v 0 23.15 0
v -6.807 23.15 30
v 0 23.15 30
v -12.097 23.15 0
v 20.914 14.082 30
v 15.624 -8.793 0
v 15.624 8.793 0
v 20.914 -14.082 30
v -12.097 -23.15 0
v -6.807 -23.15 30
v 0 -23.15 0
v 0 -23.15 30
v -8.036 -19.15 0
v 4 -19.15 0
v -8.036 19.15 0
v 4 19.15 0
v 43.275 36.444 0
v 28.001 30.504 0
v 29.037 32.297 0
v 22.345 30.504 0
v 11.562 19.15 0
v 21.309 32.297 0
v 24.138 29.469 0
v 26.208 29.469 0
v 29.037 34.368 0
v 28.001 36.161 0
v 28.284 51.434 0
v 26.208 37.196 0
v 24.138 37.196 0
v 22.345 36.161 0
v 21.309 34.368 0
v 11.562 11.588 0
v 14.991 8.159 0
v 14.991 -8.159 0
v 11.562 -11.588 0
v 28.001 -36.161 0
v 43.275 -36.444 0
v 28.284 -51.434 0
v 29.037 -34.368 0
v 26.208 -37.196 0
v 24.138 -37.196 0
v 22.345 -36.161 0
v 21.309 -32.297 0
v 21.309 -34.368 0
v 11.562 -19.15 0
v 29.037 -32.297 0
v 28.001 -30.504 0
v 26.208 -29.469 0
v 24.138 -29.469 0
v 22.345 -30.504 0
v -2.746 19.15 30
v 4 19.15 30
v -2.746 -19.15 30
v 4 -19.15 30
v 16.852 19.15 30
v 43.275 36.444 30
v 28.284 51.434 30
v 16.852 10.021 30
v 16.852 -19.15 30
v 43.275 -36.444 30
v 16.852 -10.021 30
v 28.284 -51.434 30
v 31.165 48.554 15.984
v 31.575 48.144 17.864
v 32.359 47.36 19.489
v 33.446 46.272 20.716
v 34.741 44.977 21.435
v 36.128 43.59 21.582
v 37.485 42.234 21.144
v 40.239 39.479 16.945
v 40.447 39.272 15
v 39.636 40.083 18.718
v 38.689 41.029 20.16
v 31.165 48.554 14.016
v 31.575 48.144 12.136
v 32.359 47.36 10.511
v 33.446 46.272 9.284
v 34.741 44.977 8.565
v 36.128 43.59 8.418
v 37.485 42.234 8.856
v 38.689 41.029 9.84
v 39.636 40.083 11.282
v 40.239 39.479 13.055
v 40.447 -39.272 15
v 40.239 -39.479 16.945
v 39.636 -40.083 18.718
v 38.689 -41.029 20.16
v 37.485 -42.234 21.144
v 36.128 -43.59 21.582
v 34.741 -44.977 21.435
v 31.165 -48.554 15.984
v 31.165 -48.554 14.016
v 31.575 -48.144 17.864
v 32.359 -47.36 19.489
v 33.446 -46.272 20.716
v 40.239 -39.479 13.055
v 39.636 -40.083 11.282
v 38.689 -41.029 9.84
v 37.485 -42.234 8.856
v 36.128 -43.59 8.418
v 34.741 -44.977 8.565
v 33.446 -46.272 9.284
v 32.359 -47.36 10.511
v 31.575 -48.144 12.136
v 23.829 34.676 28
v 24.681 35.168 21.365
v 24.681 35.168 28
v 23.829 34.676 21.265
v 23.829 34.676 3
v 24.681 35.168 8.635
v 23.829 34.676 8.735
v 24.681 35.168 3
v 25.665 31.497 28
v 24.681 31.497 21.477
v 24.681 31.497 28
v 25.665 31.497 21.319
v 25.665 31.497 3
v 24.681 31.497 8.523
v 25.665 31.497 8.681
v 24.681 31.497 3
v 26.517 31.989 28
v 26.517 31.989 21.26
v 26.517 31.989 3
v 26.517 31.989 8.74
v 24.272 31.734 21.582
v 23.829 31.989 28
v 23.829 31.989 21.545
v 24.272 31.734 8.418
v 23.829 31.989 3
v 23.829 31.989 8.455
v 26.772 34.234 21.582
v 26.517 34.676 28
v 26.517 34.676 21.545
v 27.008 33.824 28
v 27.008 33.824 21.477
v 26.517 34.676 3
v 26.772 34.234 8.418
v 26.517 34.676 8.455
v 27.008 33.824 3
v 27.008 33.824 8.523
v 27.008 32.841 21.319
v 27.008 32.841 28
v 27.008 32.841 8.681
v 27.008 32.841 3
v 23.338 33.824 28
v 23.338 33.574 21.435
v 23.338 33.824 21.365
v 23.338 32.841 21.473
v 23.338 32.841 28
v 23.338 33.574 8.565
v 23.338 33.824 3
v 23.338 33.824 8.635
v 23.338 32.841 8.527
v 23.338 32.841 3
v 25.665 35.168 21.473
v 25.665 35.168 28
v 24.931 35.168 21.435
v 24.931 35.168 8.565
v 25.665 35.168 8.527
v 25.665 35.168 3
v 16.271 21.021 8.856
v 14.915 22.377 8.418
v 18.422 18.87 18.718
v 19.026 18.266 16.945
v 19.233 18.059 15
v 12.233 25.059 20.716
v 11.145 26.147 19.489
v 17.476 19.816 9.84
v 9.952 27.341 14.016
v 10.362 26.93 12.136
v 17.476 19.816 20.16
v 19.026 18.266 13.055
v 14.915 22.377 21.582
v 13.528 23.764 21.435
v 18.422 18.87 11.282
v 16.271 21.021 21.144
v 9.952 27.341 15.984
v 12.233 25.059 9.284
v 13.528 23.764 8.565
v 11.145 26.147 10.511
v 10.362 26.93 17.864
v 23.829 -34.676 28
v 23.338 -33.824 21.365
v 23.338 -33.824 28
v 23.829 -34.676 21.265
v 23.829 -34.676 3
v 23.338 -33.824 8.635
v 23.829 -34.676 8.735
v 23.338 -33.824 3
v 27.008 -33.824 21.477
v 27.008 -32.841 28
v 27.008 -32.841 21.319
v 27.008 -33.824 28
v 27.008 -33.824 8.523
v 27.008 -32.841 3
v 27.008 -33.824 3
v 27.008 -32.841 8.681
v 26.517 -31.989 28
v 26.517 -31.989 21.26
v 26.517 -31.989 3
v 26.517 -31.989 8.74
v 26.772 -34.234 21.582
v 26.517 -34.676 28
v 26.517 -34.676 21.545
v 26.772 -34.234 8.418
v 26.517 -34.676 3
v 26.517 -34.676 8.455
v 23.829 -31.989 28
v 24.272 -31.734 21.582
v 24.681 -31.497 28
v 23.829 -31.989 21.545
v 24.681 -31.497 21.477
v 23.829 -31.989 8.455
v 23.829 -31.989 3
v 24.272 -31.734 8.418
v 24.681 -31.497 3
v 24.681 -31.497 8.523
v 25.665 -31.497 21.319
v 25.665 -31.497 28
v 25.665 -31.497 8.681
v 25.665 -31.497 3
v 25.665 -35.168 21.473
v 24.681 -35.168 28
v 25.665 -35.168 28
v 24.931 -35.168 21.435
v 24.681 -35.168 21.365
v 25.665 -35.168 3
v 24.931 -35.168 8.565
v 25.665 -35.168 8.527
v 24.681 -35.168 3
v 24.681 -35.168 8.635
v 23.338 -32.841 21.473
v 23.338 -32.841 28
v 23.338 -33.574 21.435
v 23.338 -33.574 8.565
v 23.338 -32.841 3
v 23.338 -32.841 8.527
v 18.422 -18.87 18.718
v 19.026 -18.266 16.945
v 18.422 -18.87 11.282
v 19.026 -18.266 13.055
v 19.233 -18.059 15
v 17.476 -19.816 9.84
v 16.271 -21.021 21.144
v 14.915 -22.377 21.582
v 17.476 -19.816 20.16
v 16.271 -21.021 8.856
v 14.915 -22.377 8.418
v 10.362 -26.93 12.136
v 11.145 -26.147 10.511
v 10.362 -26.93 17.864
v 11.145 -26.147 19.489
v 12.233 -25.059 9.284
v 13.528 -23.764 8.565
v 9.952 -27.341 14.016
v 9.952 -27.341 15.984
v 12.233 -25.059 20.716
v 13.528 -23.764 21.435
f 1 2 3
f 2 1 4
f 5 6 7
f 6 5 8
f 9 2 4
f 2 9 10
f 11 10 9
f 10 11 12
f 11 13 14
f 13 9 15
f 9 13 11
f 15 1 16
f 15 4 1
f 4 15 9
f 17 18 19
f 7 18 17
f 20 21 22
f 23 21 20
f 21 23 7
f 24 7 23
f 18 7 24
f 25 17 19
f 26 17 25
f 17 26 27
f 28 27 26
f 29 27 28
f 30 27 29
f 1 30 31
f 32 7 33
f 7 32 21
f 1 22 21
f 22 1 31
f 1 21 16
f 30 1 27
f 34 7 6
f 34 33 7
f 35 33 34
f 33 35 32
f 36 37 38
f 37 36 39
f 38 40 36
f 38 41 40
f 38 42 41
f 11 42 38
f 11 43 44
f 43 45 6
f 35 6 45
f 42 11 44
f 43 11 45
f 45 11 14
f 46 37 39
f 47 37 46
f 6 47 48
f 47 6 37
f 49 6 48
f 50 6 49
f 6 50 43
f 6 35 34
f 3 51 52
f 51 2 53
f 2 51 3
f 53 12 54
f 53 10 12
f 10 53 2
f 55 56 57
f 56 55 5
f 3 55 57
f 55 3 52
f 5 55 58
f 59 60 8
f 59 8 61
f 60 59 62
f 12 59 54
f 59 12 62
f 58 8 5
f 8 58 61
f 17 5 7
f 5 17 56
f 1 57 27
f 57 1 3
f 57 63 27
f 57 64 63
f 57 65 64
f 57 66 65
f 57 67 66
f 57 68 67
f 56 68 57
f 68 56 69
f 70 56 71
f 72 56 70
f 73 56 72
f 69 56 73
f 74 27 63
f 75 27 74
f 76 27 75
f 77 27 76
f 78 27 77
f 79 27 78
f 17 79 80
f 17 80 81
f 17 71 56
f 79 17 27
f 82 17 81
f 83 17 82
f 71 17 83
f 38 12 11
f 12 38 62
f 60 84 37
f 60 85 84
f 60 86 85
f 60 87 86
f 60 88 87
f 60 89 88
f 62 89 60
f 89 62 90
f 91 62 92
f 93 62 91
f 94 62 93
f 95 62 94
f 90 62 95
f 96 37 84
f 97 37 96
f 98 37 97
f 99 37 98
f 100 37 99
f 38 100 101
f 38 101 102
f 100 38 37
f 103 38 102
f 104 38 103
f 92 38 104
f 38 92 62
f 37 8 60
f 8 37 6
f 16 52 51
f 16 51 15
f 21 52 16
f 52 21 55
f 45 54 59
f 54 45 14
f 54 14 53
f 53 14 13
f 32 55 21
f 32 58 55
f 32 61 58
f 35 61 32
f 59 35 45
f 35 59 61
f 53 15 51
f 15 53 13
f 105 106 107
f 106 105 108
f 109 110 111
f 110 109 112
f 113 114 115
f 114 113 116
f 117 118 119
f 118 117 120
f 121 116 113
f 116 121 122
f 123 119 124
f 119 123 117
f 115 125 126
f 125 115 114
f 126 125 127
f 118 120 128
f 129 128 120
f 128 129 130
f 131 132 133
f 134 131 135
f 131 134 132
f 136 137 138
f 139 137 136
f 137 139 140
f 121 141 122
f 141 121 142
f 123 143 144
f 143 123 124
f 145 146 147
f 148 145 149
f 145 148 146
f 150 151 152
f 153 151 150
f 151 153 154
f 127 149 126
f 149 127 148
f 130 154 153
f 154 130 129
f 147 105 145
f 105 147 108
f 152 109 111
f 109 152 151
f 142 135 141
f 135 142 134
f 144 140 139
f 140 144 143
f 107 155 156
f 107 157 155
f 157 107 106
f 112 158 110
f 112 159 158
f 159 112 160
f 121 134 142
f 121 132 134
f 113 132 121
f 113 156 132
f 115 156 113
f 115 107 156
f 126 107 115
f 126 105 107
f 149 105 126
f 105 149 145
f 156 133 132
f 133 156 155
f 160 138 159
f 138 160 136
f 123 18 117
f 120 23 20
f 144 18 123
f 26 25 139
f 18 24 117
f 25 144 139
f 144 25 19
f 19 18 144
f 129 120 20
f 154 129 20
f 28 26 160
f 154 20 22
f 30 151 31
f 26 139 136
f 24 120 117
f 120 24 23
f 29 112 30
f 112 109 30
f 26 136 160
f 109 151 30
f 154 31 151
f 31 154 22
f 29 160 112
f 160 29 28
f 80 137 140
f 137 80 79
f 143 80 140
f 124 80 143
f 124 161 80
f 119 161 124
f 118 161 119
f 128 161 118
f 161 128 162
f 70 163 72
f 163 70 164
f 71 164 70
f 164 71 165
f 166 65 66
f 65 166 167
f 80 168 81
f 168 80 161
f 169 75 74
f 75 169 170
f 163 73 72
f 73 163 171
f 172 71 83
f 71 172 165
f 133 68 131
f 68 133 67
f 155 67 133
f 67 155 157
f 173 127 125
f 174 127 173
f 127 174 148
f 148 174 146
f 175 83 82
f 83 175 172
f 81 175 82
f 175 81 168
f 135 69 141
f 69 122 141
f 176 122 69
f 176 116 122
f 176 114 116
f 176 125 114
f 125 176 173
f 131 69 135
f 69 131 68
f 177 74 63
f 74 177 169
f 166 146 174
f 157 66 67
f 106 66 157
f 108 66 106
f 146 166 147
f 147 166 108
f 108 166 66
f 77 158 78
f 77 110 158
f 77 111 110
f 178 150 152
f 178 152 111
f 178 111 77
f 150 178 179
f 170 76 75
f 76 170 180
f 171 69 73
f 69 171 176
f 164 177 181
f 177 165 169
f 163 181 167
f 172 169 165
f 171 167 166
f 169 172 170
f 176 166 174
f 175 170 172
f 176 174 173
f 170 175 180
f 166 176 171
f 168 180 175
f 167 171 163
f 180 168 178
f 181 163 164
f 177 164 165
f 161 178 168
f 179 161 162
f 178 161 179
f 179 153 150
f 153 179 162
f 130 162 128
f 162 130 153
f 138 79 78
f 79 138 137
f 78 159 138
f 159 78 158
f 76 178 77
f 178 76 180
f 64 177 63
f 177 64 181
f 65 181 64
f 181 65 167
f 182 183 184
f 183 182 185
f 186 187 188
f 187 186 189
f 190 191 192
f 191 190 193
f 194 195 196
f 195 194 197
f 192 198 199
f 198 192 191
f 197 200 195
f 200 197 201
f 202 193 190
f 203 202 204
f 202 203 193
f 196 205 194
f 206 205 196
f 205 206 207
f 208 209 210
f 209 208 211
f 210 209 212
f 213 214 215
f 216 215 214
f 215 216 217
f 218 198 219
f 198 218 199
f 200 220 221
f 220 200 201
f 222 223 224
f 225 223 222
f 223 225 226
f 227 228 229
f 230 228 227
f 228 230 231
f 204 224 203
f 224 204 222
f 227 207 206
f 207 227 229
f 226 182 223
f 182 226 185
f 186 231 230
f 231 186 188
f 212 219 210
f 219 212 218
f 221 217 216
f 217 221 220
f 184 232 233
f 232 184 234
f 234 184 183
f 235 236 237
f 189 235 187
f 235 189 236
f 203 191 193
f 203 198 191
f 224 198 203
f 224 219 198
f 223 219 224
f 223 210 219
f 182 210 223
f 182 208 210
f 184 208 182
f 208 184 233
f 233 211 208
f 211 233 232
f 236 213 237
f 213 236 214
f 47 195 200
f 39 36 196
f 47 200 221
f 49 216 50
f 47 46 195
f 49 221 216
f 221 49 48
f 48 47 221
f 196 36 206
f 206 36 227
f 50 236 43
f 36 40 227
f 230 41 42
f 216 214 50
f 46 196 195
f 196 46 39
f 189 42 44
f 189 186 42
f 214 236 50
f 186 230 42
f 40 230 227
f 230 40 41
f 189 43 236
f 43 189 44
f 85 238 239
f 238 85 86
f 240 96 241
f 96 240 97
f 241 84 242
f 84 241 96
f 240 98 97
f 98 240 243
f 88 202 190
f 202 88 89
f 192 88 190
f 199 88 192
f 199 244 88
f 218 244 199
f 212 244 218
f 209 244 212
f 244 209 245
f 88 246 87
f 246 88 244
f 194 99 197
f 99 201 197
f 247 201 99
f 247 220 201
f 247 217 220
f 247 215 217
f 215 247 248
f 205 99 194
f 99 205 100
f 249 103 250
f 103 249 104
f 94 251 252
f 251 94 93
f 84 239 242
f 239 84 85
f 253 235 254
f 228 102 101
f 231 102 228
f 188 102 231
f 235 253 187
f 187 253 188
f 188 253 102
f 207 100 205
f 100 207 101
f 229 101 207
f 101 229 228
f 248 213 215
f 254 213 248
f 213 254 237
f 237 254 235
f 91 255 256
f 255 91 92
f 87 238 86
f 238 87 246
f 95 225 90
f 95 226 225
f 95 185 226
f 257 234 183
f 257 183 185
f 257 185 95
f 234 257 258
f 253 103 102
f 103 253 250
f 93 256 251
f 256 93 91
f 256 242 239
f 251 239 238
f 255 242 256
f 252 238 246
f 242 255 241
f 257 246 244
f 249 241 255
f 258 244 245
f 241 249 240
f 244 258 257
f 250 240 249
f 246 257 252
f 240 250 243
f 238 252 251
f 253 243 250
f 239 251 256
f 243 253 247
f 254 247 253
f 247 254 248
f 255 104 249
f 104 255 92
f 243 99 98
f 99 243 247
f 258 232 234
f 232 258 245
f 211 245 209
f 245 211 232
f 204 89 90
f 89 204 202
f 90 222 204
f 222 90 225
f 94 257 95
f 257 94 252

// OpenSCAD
difference(){
	union() {
		difference() {
			union() {
				difference() {
					difference() {
						translate(v = [0, 0, -10]) {
							rotate(a = 10, v = [0, 1, 0]) {
								translate(v = [-13.6500000000, -23.1500000000, 0]) {
									cube(size = [27.3000000000, 46.3000000000, 50]);
								}
							}
						}
						translate(v = [0, 0, -20]) {
							translate(v = [-50.0000000000, -50.0000000000, 0]) {
								cube(size = [100, 100, 20]);
							}
						}
					}
					translate(v = [0, 0, 30]) {
						translate(v = [-50.0000000000, -50.0000000000, 0]) {
							cube(size = [100, 100, 20]);
						}
					}
				}
				union() {
					translate(v = [0, 23.1500000000, 0]) {
						rotate(a = -45, v = [0, 0, 1]) {
							translate(v = [0, 0, 0]) {
								difference() {
									cube(size = [21.2000000000, 40, 30]);
									translate(v = [0, 40, 0]) {
									}
								}
							}
						}
					}
					translate(v = [0, -23.1500000000, 0]) {
						rotate(a = 45, v = [0, 0, 1]) {
							translate(v = [0, -40, 0]) {
								difference() {
									cube(size = [21.2000000000, 40, 30]);
								}
							}
						}
					}
				}
			}
			translate(v = [0, 0, -10]) {
				rotate(a = 10, v = [0, 1, 0]) {
					translate(v = [-9.6500000000, -19.1500000000, 0]) {
						cube(size = [19.3000000000, 38.3000000000, 50]);
					}
				}
			}
		}
	}
	/* Holes Below*/
	union(){
		difference(){
			union(){
				union(){
					translate(v = [0, 23.1500000000, 0]){
						rotate(a = -45, v = [0, 0, 1]){
							translate(v = [0, 0, 0]){
								union(){
									translate(v = [0, 40, 0]){
										union() {
											translate(v = [10.6000000000, 1, 15.0000000000]) {
												rotate(a = 90, v = [1, 0, 0]) {
													cylinder(h = 31, r = 6.6000000000);
												}
											}
											translate(v = [10.6000000000, -15.0000000000, 4]) {
												rotate(a = 180, v = [1, 0, 0]) {
													union() {
														union() {
															translate(v = [0, 0, -24]) {
																cylinder($fn = 12, h = 28, r = 1.9000000000);
															}
															translate(v = [0, 0, 1]) {
																cylinder($fn = 12, h = 3, r1 = 1.9000000000, r2 = 4);
															}
														}
														translate(v = [0, 0, 4]) {
															cylinder($fn = 12, h = 3, r = 4);
														}
													}
												}
											}
										}
									}
								}
							}
						}
					}
					translate(v = [0, -23.1500000000, 0]){
						rotate(a = 45, v = [0, 0, 1]){
							translate(v = [0, -40, 0]){
								difference(){
									union() {
										translate(v = [10.6000000000, -1, 15.0000000000]) {
											rotate(a = -90, v = [1, 0, 0]) {
												cylinder(h = 31, r = 6.6000000000);
											}
										}
										translate(v = [10.6000000000, 15.0000000000, 4]) {
											rotate(a = 180, v = [1, 0, 0]) {
												union() {
													union() {
														translate(v = [0, 0, -24]) {
															cylinder($fn = 12, h = 28, r = 1.9000000000);
														}
														translate(v = [0, 0, 1]) {
															cylinder($fn = 12, h = 3, r1 = 1.9000000000, r2 = 4);
														}
													}
													translate(v = [0, 0, 4]) {
														cylinder($fn = 12, h = 3, r = 4);
													}
												}
											}
										}
									}
								}
							}
						}
					}
				}
			}
		}
	} /* End Holes */ 
}
